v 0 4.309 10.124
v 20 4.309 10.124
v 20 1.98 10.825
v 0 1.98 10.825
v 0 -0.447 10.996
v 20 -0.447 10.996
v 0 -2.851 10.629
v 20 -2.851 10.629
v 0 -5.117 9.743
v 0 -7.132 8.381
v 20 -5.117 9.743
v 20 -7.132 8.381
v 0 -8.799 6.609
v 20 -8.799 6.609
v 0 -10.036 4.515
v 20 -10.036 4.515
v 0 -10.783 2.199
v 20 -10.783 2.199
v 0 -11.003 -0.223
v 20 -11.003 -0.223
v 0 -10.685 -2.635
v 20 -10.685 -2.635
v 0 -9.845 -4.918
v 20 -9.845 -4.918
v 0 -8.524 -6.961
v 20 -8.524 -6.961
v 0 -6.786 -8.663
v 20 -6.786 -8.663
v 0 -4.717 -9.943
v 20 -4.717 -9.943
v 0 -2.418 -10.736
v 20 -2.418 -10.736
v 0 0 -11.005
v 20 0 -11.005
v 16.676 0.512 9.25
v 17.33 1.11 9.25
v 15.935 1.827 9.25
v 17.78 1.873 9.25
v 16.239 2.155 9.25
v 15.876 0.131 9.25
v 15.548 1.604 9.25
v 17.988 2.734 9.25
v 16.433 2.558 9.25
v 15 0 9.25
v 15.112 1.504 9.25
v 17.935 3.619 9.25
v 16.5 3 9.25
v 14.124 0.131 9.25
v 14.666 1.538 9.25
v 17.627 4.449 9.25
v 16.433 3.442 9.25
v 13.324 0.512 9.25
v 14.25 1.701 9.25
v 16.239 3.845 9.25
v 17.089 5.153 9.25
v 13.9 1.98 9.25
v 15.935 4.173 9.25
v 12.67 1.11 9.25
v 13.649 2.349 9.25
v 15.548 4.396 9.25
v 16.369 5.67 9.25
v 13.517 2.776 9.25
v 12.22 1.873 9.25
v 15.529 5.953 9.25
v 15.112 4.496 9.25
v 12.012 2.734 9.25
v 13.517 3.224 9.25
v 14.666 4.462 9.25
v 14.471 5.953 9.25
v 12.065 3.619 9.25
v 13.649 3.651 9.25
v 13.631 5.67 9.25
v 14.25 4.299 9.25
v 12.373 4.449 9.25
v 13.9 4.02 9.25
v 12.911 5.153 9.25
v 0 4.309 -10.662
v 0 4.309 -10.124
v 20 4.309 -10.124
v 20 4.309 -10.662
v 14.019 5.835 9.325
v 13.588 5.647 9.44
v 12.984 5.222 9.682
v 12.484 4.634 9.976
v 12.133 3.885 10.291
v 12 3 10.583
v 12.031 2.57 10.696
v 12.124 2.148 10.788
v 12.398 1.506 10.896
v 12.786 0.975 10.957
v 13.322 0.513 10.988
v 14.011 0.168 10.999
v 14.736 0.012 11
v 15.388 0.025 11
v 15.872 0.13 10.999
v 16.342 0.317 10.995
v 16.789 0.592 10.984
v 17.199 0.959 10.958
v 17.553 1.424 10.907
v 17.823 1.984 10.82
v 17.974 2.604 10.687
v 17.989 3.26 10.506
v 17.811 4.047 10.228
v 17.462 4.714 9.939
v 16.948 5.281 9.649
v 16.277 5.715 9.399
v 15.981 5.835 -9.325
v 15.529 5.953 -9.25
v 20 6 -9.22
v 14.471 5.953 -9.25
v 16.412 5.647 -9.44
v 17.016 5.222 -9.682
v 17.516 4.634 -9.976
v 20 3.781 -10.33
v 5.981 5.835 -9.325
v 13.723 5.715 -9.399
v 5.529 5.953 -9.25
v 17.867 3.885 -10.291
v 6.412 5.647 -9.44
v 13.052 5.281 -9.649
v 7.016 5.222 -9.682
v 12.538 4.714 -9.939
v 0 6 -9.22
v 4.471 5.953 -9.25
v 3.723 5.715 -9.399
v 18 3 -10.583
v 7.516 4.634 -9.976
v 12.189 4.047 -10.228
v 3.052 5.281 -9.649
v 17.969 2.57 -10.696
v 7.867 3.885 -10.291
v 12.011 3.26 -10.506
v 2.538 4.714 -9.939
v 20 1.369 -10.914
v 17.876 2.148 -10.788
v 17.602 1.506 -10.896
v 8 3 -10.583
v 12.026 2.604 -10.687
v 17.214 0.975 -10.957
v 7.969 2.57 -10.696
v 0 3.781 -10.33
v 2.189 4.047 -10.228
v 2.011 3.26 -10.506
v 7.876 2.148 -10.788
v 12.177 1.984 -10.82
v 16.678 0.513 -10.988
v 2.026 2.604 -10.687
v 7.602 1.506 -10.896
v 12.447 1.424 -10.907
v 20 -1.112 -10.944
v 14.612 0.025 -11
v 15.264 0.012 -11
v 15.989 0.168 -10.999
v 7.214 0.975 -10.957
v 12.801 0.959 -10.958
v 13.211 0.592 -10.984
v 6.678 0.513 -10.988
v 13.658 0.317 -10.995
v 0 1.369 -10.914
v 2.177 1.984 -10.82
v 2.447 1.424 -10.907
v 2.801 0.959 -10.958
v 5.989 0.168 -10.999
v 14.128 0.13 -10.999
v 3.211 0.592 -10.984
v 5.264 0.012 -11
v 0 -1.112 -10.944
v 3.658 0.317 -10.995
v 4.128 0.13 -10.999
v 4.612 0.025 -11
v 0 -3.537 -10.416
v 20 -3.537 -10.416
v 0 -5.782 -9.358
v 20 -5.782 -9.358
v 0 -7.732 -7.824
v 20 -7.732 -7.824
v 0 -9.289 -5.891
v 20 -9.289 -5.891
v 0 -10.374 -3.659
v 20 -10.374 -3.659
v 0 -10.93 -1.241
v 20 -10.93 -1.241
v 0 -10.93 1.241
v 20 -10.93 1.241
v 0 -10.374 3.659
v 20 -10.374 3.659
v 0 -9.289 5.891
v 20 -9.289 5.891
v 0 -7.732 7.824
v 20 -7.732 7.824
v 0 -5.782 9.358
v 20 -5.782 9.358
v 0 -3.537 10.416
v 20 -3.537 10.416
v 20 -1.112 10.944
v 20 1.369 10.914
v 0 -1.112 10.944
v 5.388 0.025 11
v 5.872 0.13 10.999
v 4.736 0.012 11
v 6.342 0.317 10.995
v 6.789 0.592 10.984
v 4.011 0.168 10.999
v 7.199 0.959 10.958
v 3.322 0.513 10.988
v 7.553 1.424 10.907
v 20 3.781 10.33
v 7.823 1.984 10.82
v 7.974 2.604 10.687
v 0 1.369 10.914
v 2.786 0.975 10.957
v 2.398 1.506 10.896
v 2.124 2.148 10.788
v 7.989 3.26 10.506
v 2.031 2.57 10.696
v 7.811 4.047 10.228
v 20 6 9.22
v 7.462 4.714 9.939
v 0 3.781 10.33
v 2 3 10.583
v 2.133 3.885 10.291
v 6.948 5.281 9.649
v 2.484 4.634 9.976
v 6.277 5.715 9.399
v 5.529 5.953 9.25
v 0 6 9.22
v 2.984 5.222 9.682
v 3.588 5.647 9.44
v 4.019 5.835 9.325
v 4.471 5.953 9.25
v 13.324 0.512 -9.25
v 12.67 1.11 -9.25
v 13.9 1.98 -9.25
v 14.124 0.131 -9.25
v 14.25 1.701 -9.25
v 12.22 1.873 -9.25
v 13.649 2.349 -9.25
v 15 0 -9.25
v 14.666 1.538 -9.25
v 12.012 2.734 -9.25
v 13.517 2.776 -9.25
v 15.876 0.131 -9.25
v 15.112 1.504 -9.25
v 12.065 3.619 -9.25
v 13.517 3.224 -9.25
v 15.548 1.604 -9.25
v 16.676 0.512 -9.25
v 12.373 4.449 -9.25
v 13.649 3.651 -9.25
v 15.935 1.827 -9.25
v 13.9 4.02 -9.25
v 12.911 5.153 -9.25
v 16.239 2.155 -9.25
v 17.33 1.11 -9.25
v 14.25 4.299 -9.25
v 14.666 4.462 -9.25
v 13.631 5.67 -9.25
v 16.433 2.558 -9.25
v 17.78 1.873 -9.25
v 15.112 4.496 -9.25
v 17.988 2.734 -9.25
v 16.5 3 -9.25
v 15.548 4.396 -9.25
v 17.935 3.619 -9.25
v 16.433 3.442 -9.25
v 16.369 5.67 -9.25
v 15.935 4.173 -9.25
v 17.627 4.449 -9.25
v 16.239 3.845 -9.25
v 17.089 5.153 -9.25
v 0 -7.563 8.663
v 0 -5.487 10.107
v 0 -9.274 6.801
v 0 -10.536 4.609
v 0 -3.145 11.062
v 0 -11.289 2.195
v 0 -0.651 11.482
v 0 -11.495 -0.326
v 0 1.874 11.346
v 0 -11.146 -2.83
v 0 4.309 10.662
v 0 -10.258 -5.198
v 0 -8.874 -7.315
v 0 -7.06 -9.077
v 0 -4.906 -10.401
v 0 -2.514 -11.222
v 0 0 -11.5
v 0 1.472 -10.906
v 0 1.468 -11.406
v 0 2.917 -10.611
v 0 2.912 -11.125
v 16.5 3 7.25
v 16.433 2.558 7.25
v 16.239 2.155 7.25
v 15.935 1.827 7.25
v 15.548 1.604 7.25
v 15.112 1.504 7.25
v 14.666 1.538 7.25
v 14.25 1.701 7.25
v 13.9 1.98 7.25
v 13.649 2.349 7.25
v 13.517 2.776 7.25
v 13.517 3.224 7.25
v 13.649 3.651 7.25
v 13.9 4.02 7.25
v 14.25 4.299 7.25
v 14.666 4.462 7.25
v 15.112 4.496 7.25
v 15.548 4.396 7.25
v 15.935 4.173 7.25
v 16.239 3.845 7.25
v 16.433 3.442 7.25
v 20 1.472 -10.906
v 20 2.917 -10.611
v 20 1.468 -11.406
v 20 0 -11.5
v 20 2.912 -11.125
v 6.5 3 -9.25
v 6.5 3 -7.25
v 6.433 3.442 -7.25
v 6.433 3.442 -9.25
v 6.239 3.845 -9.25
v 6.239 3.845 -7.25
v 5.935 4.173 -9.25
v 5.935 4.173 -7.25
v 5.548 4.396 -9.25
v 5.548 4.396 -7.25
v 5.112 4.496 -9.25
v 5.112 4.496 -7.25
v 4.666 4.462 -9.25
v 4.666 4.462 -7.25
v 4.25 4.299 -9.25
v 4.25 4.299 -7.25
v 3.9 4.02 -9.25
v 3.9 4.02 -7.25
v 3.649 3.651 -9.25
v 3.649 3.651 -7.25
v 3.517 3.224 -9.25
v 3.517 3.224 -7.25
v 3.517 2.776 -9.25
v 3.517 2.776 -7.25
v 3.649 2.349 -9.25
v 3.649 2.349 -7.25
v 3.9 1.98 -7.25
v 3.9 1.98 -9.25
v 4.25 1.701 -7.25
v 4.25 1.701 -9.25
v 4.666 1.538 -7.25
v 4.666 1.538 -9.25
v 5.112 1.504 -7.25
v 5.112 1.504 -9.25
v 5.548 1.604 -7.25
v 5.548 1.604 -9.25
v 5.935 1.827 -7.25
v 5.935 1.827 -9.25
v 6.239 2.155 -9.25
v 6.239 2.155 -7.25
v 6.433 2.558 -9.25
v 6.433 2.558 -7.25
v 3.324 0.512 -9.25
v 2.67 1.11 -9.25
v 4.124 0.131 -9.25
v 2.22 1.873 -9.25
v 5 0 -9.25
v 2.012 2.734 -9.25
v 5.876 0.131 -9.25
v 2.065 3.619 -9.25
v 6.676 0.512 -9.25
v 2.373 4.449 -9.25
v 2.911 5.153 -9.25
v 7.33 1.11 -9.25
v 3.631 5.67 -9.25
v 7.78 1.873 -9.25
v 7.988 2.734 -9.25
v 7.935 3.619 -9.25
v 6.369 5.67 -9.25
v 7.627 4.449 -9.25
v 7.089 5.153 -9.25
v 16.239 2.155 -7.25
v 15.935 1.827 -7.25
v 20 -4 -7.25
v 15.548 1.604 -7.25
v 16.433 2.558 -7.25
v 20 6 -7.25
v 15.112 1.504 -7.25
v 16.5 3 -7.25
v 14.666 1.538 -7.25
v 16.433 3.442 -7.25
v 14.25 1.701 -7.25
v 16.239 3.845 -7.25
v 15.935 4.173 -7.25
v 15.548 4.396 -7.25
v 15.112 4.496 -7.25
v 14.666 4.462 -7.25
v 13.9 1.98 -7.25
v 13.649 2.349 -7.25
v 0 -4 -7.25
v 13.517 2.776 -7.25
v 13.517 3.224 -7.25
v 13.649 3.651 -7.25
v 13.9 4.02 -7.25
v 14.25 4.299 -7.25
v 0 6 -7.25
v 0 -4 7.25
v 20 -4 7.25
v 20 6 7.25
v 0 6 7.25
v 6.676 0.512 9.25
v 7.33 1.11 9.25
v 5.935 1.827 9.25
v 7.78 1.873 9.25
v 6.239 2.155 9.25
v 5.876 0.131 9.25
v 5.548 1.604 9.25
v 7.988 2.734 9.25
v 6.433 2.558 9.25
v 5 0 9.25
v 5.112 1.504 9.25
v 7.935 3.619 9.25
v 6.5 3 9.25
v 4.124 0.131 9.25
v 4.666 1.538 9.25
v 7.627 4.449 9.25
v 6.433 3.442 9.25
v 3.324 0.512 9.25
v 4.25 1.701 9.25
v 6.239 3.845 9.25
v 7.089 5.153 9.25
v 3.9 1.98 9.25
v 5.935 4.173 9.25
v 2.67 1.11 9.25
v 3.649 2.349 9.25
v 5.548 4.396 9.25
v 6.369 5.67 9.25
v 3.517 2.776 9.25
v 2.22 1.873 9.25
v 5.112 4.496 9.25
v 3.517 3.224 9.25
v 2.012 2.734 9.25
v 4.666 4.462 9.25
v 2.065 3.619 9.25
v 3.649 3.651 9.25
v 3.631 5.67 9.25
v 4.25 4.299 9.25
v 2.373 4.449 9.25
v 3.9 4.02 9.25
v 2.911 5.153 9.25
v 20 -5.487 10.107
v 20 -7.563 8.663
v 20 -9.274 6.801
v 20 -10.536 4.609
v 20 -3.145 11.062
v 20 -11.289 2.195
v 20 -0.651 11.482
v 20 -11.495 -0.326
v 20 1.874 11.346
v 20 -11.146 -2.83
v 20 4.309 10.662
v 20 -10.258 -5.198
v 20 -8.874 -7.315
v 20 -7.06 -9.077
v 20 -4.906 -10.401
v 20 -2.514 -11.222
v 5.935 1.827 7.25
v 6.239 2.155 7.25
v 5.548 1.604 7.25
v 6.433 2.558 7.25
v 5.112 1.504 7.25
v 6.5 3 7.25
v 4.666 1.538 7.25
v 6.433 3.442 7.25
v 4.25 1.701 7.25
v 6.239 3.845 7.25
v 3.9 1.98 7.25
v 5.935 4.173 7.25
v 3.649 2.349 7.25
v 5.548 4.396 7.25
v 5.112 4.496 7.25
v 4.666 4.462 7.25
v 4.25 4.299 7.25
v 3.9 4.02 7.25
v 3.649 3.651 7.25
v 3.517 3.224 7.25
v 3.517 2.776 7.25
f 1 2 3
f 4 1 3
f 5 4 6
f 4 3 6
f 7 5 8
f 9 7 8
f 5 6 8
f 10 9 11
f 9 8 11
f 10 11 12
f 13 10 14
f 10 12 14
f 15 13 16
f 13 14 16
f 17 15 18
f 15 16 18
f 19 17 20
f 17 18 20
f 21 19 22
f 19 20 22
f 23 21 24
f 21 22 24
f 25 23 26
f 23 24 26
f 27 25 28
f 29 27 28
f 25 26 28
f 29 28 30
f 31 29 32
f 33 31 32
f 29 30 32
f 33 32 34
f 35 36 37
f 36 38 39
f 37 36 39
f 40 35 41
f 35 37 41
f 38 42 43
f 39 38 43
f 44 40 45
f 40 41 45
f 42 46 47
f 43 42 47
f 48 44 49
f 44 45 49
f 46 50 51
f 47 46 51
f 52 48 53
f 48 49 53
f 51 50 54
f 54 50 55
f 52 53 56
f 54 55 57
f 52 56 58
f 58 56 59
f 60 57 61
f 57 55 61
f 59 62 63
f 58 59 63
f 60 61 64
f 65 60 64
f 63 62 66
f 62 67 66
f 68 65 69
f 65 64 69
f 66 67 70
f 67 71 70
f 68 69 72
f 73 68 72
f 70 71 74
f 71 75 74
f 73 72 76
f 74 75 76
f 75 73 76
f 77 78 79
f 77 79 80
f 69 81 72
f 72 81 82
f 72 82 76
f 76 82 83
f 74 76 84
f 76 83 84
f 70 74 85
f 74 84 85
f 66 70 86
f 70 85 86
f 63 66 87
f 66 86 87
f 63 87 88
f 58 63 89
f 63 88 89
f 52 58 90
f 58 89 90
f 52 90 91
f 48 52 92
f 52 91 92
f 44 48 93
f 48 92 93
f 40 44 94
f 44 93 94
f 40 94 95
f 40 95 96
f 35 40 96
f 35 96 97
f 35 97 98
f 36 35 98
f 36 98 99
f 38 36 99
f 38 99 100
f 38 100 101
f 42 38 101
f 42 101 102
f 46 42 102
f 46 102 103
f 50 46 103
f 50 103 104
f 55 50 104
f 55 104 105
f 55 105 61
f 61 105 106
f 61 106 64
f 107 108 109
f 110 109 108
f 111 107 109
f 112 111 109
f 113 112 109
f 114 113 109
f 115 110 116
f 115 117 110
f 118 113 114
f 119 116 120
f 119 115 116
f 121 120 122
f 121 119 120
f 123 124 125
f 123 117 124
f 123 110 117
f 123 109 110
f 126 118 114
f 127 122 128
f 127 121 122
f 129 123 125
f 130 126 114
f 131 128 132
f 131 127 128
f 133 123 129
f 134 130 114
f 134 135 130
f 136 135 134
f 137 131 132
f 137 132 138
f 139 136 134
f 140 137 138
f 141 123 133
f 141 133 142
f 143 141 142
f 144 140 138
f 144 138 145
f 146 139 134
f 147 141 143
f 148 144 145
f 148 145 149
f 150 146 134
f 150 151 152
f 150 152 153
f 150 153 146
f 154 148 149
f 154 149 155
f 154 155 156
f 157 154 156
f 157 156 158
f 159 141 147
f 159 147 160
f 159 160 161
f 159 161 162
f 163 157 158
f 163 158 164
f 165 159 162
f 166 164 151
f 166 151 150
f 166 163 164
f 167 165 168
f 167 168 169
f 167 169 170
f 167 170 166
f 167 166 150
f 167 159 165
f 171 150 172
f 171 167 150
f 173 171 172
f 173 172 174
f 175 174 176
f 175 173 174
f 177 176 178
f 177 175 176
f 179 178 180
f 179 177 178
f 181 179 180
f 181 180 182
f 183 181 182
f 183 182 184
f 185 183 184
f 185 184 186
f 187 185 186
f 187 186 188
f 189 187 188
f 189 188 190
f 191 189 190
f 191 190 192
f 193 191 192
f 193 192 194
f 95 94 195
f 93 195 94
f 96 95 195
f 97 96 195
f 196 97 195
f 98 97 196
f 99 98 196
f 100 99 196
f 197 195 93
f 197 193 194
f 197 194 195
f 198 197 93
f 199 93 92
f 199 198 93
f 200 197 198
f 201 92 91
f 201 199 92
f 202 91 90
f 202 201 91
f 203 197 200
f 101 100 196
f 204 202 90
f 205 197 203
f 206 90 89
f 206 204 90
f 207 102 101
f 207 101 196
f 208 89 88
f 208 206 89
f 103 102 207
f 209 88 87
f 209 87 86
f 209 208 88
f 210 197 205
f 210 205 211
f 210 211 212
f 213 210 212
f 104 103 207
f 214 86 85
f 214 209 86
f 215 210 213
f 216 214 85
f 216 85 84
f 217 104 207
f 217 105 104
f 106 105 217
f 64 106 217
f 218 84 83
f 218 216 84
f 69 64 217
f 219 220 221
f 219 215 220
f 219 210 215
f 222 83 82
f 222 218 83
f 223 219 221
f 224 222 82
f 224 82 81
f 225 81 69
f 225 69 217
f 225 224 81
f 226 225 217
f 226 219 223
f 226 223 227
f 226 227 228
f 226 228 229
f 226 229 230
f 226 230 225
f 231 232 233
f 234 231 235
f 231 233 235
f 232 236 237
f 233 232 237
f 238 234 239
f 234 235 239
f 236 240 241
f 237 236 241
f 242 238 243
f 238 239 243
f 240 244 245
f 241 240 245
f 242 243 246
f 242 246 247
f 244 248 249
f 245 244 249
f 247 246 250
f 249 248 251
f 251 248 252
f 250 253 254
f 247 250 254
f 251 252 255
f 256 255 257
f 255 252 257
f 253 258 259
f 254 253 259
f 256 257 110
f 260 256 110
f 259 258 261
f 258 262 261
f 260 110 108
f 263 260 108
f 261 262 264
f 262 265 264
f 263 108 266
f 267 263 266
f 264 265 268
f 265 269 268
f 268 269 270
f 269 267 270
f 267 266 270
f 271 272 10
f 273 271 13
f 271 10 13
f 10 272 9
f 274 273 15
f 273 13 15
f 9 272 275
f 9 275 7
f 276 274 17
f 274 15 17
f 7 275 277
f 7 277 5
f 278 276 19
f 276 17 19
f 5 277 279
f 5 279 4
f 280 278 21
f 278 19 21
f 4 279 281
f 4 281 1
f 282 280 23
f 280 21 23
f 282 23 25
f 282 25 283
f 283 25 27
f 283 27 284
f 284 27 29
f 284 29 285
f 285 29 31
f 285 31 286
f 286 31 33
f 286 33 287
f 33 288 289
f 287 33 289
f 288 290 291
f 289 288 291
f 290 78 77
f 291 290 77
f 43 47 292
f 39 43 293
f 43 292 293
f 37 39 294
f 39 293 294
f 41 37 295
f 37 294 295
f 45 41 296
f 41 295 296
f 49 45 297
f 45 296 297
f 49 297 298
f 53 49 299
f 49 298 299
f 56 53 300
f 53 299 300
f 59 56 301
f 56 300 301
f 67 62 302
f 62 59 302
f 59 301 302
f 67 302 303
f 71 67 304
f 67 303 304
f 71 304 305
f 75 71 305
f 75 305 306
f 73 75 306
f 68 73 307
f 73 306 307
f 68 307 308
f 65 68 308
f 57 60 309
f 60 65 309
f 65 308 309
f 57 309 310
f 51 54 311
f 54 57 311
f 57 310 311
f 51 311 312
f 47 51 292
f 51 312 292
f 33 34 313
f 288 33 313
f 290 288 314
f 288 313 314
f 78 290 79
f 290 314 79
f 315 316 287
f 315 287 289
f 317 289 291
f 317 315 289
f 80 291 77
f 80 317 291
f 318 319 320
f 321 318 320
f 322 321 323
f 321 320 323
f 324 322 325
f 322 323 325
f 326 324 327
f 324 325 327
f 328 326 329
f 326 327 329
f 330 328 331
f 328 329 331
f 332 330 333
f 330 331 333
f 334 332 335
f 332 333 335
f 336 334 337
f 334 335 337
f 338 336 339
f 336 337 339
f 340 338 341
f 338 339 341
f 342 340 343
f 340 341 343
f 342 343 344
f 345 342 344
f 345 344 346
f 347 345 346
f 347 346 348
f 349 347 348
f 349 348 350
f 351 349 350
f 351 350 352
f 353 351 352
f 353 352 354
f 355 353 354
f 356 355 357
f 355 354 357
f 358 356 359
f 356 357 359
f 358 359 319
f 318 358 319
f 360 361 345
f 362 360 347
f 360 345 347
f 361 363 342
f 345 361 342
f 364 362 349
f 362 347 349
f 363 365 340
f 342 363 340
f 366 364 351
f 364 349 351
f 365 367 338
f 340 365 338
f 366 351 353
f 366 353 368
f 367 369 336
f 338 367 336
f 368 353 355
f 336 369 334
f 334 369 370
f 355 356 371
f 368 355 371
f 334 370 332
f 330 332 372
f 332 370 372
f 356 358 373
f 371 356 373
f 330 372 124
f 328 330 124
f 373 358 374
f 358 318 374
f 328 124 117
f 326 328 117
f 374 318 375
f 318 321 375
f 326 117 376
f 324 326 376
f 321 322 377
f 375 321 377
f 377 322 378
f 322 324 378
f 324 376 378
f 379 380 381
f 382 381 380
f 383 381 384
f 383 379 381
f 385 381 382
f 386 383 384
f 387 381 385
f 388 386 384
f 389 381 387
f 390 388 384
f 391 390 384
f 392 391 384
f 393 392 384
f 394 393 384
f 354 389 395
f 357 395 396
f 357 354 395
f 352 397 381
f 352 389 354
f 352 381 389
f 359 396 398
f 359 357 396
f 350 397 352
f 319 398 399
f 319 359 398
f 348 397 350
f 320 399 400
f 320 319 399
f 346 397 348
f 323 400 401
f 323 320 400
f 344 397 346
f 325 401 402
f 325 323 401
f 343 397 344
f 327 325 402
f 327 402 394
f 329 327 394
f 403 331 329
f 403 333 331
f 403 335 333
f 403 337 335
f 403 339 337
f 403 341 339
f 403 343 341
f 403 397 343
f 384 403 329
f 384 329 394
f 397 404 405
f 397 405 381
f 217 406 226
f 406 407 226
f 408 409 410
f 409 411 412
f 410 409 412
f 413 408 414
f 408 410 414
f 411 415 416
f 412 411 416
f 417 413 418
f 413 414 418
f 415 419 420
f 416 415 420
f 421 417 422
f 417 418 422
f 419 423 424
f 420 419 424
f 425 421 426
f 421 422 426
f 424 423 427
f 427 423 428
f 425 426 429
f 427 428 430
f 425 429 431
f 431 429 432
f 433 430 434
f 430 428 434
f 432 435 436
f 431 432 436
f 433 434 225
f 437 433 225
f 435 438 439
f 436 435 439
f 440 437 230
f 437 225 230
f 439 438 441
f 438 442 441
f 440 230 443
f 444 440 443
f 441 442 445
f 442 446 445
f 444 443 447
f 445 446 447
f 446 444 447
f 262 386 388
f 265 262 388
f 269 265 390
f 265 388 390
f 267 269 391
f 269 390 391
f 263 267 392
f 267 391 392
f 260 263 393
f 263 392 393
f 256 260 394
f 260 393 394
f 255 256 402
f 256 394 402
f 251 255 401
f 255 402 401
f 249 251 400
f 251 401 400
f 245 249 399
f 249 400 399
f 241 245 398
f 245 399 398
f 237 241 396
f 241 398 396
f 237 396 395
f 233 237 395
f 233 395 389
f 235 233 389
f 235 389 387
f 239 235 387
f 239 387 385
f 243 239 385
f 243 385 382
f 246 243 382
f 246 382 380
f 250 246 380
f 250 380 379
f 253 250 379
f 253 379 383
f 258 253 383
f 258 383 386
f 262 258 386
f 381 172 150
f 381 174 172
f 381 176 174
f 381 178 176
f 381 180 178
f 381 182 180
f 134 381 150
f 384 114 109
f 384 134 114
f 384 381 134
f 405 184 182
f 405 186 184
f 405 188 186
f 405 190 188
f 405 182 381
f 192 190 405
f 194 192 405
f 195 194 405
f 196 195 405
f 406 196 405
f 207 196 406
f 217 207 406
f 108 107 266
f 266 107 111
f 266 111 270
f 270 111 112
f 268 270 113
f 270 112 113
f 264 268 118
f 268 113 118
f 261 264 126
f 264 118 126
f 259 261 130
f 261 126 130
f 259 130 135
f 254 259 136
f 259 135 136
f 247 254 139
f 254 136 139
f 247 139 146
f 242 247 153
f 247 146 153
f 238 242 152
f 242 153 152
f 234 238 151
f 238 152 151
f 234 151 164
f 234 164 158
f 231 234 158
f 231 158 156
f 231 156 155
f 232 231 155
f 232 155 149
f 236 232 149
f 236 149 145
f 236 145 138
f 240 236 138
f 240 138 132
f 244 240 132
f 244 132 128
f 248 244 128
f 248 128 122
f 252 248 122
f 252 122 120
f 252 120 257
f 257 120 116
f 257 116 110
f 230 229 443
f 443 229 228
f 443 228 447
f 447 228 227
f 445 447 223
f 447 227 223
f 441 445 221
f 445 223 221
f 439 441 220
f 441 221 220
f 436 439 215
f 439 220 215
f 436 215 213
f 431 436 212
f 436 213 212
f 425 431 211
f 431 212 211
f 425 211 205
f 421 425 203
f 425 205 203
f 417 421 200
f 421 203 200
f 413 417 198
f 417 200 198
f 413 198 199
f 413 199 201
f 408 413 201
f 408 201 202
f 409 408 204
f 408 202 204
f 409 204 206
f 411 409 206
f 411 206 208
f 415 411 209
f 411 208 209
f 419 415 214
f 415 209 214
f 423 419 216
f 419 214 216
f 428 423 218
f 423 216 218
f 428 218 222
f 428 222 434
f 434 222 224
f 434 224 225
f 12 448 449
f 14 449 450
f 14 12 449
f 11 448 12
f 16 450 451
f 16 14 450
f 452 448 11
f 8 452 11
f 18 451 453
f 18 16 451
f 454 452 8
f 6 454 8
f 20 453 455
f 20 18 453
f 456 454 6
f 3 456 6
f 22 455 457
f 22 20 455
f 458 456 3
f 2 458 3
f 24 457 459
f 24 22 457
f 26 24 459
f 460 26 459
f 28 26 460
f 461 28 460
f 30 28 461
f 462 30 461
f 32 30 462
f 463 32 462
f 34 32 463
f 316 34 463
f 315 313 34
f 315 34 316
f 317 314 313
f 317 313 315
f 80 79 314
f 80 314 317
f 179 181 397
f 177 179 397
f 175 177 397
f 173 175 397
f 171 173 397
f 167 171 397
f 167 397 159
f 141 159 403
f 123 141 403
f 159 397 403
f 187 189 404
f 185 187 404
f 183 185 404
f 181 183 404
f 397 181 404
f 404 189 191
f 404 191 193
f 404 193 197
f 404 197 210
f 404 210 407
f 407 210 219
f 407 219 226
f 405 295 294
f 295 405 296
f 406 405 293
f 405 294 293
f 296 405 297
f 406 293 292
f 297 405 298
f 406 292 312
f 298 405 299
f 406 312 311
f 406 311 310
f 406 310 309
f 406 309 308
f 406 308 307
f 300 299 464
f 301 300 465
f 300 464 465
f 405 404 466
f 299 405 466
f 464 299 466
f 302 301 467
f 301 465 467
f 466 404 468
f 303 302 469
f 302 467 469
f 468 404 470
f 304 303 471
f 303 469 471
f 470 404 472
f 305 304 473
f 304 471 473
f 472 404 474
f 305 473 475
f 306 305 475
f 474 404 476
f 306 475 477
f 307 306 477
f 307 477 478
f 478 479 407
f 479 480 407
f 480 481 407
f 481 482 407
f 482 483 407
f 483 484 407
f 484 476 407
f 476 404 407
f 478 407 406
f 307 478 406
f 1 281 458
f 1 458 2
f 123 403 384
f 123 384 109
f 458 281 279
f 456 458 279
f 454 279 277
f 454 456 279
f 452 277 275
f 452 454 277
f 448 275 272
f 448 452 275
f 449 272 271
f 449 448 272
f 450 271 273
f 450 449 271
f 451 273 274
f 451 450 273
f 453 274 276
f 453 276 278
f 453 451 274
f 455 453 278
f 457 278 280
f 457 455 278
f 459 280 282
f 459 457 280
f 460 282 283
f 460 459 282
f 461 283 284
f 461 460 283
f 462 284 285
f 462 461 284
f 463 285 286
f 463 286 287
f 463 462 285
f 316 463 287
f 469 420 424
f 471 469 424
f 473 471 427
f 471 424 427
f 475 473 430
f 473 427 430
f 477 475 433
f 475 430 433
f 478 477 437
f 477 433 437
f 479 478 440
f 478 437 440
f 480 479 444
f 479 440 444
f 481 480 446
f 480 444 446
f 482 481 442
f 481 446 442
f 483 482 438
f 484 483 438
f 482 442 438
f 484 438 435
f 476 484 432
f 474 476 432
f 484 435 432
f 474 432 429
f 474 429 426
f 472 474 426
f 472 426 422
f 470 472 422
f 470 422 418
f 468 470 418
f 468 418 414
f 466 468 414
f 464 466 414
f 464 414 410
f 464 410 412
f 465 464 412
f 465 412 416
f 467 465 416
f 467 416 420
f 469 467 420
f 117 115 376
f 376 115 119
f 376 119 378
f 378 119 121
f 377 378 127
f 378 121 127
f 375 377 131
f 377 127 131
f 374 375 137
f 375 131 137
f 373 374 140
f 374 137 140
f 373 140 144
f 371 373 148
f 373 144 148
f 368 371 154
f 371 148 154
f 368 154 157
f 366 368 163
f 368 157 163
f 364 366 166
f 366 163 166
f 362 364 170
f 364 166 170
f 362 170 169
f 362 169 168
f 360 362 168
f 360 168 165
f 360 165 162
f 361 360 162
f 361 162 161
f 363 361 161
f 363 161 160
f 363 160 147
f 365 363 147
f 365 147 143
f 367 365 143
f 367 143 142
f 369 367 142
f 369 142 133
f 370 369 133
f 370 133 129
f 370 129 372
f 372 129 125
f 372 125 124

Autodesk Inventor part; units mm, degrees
ref_plane "YZ Plane" through (0, 0, 0) normal (1, 0, 0) x (0, 1, 0)
sketch "Sketch1" plane through (0, 0, 0) normal (1, 0, 0) x (0, 1, 0)
  circle A0 centre (0, 0) radius 11
  line L0 (0, 0) -> (0, -7.25)
  line L1 (0, 0) -> (0, 7.25)
  line L2 (0, 7.25) -> (6, 7.25)
  line L3 (6, 7.25) -> (6, 10)
  line L4 (6, 10) -> (0, 10)
  line L5 (0, 10) -> (0, 7.25)
  line L6 (0, -7.25) -> (6, -7.25)
  line L7 (6, -7.25) -> (6, -10)
  line L8 (6, -10) -> (0, -10)
  line L9 (0, -10) -> (0, -7.25)
  line L10 (0, 7.25) -> (-4, 7.25)
  line L11 (-4, 7.25) -> (-4, -7.25)
  line L12 (-4, -7.25) -> (0, -7.25)
  line L13 (0, -7.25) -> (0, 7.25)
  point P0 (6, 9.2195)
  point P1 (6, -9.2195)
  dimension "d0" = 22
  dimension "d1" = 7.25
  dimension "d2" = 7.25
  dimension "d3" = 6
  dimension "d4" = 4
extrude "Extrusion1" add sketch "Sketch1" along normal blind 20 contours L3 L2 L5 L4 A0 | A0 L8 L9 L6 L7 | L4 L5 L10 L11 L12 L9 L8 A0
sketch "Sketch2" plane through (0, -4, -7.25) normal (0, 0, 1) x (1, 0, 0)
  line L0 (0, 10) -> (20, 10) projected
  line L1 (0, 10) -> (5, 10)
  line L2 (5, 10) -> (5, 7)
  line L3 (5, 7) -> (0, 7)
  line L4 (0, 7) -> (0, 10)
  line L5 (20, 10) -> (15, 10)
  line L6 (15, 10) -> (15, 7)
  line L7 (15, 7) -> (20, 7)
  line L8 (20, 7) -> (20, 10)
  circle A0 centre (15, 7) radius 1.5
  circle A1 centre (5, 7) radius 1.5
  point P0 (0, 4)
  dimension "d7" = 5
  dimension "d8" = 3
  dimension "d9" = 5
  dimension "d10" = 3
  dimension "d11" = 3
  dimension "d12" = 3
extrude "Extrusion2" cut sketch "Sketch2" along normal mid plane 50 contours A1 L3 L2 | L2 L3 A1 | A0 L7 L6 | L6 L7 A0
ref_plane "Work Plane1" through (0, -4, -17.25) normal (0, 0, 1) x (1, 0, 0)
sketch "Sketch3" plane through (0, -4, -17.25) normal (0, 0, 1) x (1, 0, 0)
  circle A0 centre (15, 7) radius 1.5 projected
  circle A1 centre (15, 7) radius 3
  circle A2 centre (5, 7) radius 1.5 projected
  circle A3 centre (5, 7) radius 3
  point P0 (0, 4)
  dimension "d16" = 6
  dimension "d17" = 6
extrude "Extrusion3" cut sketch "Sketch3" along normal blind 8
ref_plane "Work Plane2" through (0, -4, 17.25) normal (0, 0, -1) x (-1, 0, 0)
sketch "Sketch4" plane through (0, -4, 17.25) normal (0, 0, -1) x (-1, 0, 0)
  circle A0 centre (-5, 7) radius 1.5 projected
  circle A1 centre (-5, 7) radius 3
  line L0 (0, 10) -> (-20, 10) projected
  circle A2 centre (-15, 7) radius 1.5 projected
  circle A3 centre (-15, 7) radius 3
  point P0 (0, 4)
  point P1 (-15.0159, 10)
  point P2 (-14.9841, 10)
extrude "Extrusion4" cut sketch "Sketch4" along normal blind 8
sketch "Sketch5" plane through (20, 0, 0) normal (1, 0, 0) x (0, 0, -1)
  arc A0 (-9.2195, 6) -> (9.2195, 6) centre (0, 0) ccw projected
  circle A1 centre (0, 0) radius 11.5
  line L0 (-10.6622, 4.3089) -> (11.0385, 4.3089)
  line L1 (7.25, 1.5) -> (7.25, 4.5) projected
  circle A2 centre (0, 0) radius 11.005
  point P0 (-10.1264, 4.3089)
  point P1 (10.6622, 4.3089)
  point P2 (10.1264, 4.3089)
  dimension "d23" = 23
  dimension "d24" = 22.01
extrude "Extrusion5" add sketch "Sketch5" against normal up to surface (20 mm away) contours A2 L0 A1 picked at (-10.5472, 3.4796)
properties part number "shoe"
